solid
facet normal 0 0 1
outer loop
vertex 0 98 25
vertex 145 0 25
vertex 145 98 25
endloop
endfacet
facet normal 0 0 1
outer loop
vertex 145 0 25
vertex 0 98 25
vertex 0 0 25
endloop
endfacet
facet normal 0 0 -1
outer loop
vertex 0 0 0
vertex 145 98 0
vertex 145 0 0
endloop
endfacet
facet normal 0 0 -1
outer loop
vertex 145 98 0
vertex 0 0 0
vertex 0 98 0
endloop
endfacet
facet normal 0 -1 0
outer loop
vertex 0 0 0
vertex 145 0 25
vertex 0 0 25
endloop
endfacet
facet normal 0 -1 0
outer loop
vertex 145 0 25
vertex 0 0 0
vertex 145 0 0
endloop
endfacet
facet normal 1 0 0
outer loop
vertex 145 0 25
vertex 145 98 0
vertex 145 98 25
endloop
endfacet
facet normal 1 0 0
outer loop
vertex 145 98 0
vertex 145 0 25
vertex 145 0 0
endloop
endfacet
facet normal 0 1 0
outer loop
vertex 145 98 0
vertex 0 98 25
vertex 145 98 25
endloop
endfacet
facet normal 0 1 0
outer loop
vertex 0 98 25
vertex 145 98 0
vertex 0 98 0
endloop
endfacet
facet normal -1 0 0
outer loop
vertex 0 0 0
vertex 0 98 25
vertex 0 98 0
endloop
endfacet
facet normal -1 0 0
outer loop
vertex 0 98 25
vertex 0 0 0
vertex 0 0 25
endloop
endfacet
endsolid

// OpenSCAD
// +++ CONFIG +++
X_CARD = 145;
Y_CARD = 98; 
Z_CARD = 25;

R_FINGERHELP =10;

PW_FLOOR = 2; // PoWer
PW_WALL = 1.5;
X_LEN_WALL = len_wall(15); // LENght
Y_LEN_WALL = len_wall(7);
function len_wall(len_wall) = len_wall+PW_WALL;


// +++ MODULES +++

module Baseplate (){
	X = 2*PW_WALL + X_CARD;
	Y = 2*PW_WALL +  Y_CARD;
	Z = PW_FLOOR;
	
	difference(){
		cube([X,Y,Z]);
		translate([0 , PW_WALL+0.5*Y_CARD , -0.01]) cylinder(h=PW_FLOOR+0.02, r=R_FINGERHELP);
		translate([X , PW_WALL+0.5*Y_CARD , -0.01]) cylinder(h=PW_FLOOR+0.02, r=R_FINGERHELP);
		
		translate([0.5*X , 0 , -0.01]) scale([2,1,1]) cylinder(h=PW_FLOOR+0.02, r=R_FINGERHELP);
		translate([0.5*X , 2*PW_WALL+Y_CARD , -0.01]) scale([2,1,1]) cylinder(h=PW_FLOOR+0.02, r=R_FINGERHELP);
		
	}
}


module Walls (){
	translate([0,0,PW_FLOOR]){
		translate([0,0,0]){
			cube([PW_WALL , Y_LEN_WALL , Z_CARD]);
			cube([X_LEN_WALL , PW_WALL , Z_CARD]);
		}
		
		translate([0,Y_CARD+2*PW_WALL-Y_LEN_WALL,0]){
			cube([PW_WALL , Y_LEN_WALL , Z_CARD]);
		}
		translate([0,Y_CARD+PW_WALL,0]){
			cube([X_LEN_WALL , PW_WALL , Z_CARD]);
		}
		
		translate([2*PW_WALL+X_CARD-X_LEN_WALL,0,0]){
			cube([X_LEN_WALL , PW_WALL , Z_CARD]);
		}
		
		translate([2*PW_WALL+X_CARD-X_LEN_WALL,PW_WALL+Y_CARD,0]){
			cube([X_LEN_WALL , PW_WALL , Z_CARD]);
		}
	}
}



// +++ MAKE +++

cube([ X_CARD , Y_CARD , Z_CARD ]);
